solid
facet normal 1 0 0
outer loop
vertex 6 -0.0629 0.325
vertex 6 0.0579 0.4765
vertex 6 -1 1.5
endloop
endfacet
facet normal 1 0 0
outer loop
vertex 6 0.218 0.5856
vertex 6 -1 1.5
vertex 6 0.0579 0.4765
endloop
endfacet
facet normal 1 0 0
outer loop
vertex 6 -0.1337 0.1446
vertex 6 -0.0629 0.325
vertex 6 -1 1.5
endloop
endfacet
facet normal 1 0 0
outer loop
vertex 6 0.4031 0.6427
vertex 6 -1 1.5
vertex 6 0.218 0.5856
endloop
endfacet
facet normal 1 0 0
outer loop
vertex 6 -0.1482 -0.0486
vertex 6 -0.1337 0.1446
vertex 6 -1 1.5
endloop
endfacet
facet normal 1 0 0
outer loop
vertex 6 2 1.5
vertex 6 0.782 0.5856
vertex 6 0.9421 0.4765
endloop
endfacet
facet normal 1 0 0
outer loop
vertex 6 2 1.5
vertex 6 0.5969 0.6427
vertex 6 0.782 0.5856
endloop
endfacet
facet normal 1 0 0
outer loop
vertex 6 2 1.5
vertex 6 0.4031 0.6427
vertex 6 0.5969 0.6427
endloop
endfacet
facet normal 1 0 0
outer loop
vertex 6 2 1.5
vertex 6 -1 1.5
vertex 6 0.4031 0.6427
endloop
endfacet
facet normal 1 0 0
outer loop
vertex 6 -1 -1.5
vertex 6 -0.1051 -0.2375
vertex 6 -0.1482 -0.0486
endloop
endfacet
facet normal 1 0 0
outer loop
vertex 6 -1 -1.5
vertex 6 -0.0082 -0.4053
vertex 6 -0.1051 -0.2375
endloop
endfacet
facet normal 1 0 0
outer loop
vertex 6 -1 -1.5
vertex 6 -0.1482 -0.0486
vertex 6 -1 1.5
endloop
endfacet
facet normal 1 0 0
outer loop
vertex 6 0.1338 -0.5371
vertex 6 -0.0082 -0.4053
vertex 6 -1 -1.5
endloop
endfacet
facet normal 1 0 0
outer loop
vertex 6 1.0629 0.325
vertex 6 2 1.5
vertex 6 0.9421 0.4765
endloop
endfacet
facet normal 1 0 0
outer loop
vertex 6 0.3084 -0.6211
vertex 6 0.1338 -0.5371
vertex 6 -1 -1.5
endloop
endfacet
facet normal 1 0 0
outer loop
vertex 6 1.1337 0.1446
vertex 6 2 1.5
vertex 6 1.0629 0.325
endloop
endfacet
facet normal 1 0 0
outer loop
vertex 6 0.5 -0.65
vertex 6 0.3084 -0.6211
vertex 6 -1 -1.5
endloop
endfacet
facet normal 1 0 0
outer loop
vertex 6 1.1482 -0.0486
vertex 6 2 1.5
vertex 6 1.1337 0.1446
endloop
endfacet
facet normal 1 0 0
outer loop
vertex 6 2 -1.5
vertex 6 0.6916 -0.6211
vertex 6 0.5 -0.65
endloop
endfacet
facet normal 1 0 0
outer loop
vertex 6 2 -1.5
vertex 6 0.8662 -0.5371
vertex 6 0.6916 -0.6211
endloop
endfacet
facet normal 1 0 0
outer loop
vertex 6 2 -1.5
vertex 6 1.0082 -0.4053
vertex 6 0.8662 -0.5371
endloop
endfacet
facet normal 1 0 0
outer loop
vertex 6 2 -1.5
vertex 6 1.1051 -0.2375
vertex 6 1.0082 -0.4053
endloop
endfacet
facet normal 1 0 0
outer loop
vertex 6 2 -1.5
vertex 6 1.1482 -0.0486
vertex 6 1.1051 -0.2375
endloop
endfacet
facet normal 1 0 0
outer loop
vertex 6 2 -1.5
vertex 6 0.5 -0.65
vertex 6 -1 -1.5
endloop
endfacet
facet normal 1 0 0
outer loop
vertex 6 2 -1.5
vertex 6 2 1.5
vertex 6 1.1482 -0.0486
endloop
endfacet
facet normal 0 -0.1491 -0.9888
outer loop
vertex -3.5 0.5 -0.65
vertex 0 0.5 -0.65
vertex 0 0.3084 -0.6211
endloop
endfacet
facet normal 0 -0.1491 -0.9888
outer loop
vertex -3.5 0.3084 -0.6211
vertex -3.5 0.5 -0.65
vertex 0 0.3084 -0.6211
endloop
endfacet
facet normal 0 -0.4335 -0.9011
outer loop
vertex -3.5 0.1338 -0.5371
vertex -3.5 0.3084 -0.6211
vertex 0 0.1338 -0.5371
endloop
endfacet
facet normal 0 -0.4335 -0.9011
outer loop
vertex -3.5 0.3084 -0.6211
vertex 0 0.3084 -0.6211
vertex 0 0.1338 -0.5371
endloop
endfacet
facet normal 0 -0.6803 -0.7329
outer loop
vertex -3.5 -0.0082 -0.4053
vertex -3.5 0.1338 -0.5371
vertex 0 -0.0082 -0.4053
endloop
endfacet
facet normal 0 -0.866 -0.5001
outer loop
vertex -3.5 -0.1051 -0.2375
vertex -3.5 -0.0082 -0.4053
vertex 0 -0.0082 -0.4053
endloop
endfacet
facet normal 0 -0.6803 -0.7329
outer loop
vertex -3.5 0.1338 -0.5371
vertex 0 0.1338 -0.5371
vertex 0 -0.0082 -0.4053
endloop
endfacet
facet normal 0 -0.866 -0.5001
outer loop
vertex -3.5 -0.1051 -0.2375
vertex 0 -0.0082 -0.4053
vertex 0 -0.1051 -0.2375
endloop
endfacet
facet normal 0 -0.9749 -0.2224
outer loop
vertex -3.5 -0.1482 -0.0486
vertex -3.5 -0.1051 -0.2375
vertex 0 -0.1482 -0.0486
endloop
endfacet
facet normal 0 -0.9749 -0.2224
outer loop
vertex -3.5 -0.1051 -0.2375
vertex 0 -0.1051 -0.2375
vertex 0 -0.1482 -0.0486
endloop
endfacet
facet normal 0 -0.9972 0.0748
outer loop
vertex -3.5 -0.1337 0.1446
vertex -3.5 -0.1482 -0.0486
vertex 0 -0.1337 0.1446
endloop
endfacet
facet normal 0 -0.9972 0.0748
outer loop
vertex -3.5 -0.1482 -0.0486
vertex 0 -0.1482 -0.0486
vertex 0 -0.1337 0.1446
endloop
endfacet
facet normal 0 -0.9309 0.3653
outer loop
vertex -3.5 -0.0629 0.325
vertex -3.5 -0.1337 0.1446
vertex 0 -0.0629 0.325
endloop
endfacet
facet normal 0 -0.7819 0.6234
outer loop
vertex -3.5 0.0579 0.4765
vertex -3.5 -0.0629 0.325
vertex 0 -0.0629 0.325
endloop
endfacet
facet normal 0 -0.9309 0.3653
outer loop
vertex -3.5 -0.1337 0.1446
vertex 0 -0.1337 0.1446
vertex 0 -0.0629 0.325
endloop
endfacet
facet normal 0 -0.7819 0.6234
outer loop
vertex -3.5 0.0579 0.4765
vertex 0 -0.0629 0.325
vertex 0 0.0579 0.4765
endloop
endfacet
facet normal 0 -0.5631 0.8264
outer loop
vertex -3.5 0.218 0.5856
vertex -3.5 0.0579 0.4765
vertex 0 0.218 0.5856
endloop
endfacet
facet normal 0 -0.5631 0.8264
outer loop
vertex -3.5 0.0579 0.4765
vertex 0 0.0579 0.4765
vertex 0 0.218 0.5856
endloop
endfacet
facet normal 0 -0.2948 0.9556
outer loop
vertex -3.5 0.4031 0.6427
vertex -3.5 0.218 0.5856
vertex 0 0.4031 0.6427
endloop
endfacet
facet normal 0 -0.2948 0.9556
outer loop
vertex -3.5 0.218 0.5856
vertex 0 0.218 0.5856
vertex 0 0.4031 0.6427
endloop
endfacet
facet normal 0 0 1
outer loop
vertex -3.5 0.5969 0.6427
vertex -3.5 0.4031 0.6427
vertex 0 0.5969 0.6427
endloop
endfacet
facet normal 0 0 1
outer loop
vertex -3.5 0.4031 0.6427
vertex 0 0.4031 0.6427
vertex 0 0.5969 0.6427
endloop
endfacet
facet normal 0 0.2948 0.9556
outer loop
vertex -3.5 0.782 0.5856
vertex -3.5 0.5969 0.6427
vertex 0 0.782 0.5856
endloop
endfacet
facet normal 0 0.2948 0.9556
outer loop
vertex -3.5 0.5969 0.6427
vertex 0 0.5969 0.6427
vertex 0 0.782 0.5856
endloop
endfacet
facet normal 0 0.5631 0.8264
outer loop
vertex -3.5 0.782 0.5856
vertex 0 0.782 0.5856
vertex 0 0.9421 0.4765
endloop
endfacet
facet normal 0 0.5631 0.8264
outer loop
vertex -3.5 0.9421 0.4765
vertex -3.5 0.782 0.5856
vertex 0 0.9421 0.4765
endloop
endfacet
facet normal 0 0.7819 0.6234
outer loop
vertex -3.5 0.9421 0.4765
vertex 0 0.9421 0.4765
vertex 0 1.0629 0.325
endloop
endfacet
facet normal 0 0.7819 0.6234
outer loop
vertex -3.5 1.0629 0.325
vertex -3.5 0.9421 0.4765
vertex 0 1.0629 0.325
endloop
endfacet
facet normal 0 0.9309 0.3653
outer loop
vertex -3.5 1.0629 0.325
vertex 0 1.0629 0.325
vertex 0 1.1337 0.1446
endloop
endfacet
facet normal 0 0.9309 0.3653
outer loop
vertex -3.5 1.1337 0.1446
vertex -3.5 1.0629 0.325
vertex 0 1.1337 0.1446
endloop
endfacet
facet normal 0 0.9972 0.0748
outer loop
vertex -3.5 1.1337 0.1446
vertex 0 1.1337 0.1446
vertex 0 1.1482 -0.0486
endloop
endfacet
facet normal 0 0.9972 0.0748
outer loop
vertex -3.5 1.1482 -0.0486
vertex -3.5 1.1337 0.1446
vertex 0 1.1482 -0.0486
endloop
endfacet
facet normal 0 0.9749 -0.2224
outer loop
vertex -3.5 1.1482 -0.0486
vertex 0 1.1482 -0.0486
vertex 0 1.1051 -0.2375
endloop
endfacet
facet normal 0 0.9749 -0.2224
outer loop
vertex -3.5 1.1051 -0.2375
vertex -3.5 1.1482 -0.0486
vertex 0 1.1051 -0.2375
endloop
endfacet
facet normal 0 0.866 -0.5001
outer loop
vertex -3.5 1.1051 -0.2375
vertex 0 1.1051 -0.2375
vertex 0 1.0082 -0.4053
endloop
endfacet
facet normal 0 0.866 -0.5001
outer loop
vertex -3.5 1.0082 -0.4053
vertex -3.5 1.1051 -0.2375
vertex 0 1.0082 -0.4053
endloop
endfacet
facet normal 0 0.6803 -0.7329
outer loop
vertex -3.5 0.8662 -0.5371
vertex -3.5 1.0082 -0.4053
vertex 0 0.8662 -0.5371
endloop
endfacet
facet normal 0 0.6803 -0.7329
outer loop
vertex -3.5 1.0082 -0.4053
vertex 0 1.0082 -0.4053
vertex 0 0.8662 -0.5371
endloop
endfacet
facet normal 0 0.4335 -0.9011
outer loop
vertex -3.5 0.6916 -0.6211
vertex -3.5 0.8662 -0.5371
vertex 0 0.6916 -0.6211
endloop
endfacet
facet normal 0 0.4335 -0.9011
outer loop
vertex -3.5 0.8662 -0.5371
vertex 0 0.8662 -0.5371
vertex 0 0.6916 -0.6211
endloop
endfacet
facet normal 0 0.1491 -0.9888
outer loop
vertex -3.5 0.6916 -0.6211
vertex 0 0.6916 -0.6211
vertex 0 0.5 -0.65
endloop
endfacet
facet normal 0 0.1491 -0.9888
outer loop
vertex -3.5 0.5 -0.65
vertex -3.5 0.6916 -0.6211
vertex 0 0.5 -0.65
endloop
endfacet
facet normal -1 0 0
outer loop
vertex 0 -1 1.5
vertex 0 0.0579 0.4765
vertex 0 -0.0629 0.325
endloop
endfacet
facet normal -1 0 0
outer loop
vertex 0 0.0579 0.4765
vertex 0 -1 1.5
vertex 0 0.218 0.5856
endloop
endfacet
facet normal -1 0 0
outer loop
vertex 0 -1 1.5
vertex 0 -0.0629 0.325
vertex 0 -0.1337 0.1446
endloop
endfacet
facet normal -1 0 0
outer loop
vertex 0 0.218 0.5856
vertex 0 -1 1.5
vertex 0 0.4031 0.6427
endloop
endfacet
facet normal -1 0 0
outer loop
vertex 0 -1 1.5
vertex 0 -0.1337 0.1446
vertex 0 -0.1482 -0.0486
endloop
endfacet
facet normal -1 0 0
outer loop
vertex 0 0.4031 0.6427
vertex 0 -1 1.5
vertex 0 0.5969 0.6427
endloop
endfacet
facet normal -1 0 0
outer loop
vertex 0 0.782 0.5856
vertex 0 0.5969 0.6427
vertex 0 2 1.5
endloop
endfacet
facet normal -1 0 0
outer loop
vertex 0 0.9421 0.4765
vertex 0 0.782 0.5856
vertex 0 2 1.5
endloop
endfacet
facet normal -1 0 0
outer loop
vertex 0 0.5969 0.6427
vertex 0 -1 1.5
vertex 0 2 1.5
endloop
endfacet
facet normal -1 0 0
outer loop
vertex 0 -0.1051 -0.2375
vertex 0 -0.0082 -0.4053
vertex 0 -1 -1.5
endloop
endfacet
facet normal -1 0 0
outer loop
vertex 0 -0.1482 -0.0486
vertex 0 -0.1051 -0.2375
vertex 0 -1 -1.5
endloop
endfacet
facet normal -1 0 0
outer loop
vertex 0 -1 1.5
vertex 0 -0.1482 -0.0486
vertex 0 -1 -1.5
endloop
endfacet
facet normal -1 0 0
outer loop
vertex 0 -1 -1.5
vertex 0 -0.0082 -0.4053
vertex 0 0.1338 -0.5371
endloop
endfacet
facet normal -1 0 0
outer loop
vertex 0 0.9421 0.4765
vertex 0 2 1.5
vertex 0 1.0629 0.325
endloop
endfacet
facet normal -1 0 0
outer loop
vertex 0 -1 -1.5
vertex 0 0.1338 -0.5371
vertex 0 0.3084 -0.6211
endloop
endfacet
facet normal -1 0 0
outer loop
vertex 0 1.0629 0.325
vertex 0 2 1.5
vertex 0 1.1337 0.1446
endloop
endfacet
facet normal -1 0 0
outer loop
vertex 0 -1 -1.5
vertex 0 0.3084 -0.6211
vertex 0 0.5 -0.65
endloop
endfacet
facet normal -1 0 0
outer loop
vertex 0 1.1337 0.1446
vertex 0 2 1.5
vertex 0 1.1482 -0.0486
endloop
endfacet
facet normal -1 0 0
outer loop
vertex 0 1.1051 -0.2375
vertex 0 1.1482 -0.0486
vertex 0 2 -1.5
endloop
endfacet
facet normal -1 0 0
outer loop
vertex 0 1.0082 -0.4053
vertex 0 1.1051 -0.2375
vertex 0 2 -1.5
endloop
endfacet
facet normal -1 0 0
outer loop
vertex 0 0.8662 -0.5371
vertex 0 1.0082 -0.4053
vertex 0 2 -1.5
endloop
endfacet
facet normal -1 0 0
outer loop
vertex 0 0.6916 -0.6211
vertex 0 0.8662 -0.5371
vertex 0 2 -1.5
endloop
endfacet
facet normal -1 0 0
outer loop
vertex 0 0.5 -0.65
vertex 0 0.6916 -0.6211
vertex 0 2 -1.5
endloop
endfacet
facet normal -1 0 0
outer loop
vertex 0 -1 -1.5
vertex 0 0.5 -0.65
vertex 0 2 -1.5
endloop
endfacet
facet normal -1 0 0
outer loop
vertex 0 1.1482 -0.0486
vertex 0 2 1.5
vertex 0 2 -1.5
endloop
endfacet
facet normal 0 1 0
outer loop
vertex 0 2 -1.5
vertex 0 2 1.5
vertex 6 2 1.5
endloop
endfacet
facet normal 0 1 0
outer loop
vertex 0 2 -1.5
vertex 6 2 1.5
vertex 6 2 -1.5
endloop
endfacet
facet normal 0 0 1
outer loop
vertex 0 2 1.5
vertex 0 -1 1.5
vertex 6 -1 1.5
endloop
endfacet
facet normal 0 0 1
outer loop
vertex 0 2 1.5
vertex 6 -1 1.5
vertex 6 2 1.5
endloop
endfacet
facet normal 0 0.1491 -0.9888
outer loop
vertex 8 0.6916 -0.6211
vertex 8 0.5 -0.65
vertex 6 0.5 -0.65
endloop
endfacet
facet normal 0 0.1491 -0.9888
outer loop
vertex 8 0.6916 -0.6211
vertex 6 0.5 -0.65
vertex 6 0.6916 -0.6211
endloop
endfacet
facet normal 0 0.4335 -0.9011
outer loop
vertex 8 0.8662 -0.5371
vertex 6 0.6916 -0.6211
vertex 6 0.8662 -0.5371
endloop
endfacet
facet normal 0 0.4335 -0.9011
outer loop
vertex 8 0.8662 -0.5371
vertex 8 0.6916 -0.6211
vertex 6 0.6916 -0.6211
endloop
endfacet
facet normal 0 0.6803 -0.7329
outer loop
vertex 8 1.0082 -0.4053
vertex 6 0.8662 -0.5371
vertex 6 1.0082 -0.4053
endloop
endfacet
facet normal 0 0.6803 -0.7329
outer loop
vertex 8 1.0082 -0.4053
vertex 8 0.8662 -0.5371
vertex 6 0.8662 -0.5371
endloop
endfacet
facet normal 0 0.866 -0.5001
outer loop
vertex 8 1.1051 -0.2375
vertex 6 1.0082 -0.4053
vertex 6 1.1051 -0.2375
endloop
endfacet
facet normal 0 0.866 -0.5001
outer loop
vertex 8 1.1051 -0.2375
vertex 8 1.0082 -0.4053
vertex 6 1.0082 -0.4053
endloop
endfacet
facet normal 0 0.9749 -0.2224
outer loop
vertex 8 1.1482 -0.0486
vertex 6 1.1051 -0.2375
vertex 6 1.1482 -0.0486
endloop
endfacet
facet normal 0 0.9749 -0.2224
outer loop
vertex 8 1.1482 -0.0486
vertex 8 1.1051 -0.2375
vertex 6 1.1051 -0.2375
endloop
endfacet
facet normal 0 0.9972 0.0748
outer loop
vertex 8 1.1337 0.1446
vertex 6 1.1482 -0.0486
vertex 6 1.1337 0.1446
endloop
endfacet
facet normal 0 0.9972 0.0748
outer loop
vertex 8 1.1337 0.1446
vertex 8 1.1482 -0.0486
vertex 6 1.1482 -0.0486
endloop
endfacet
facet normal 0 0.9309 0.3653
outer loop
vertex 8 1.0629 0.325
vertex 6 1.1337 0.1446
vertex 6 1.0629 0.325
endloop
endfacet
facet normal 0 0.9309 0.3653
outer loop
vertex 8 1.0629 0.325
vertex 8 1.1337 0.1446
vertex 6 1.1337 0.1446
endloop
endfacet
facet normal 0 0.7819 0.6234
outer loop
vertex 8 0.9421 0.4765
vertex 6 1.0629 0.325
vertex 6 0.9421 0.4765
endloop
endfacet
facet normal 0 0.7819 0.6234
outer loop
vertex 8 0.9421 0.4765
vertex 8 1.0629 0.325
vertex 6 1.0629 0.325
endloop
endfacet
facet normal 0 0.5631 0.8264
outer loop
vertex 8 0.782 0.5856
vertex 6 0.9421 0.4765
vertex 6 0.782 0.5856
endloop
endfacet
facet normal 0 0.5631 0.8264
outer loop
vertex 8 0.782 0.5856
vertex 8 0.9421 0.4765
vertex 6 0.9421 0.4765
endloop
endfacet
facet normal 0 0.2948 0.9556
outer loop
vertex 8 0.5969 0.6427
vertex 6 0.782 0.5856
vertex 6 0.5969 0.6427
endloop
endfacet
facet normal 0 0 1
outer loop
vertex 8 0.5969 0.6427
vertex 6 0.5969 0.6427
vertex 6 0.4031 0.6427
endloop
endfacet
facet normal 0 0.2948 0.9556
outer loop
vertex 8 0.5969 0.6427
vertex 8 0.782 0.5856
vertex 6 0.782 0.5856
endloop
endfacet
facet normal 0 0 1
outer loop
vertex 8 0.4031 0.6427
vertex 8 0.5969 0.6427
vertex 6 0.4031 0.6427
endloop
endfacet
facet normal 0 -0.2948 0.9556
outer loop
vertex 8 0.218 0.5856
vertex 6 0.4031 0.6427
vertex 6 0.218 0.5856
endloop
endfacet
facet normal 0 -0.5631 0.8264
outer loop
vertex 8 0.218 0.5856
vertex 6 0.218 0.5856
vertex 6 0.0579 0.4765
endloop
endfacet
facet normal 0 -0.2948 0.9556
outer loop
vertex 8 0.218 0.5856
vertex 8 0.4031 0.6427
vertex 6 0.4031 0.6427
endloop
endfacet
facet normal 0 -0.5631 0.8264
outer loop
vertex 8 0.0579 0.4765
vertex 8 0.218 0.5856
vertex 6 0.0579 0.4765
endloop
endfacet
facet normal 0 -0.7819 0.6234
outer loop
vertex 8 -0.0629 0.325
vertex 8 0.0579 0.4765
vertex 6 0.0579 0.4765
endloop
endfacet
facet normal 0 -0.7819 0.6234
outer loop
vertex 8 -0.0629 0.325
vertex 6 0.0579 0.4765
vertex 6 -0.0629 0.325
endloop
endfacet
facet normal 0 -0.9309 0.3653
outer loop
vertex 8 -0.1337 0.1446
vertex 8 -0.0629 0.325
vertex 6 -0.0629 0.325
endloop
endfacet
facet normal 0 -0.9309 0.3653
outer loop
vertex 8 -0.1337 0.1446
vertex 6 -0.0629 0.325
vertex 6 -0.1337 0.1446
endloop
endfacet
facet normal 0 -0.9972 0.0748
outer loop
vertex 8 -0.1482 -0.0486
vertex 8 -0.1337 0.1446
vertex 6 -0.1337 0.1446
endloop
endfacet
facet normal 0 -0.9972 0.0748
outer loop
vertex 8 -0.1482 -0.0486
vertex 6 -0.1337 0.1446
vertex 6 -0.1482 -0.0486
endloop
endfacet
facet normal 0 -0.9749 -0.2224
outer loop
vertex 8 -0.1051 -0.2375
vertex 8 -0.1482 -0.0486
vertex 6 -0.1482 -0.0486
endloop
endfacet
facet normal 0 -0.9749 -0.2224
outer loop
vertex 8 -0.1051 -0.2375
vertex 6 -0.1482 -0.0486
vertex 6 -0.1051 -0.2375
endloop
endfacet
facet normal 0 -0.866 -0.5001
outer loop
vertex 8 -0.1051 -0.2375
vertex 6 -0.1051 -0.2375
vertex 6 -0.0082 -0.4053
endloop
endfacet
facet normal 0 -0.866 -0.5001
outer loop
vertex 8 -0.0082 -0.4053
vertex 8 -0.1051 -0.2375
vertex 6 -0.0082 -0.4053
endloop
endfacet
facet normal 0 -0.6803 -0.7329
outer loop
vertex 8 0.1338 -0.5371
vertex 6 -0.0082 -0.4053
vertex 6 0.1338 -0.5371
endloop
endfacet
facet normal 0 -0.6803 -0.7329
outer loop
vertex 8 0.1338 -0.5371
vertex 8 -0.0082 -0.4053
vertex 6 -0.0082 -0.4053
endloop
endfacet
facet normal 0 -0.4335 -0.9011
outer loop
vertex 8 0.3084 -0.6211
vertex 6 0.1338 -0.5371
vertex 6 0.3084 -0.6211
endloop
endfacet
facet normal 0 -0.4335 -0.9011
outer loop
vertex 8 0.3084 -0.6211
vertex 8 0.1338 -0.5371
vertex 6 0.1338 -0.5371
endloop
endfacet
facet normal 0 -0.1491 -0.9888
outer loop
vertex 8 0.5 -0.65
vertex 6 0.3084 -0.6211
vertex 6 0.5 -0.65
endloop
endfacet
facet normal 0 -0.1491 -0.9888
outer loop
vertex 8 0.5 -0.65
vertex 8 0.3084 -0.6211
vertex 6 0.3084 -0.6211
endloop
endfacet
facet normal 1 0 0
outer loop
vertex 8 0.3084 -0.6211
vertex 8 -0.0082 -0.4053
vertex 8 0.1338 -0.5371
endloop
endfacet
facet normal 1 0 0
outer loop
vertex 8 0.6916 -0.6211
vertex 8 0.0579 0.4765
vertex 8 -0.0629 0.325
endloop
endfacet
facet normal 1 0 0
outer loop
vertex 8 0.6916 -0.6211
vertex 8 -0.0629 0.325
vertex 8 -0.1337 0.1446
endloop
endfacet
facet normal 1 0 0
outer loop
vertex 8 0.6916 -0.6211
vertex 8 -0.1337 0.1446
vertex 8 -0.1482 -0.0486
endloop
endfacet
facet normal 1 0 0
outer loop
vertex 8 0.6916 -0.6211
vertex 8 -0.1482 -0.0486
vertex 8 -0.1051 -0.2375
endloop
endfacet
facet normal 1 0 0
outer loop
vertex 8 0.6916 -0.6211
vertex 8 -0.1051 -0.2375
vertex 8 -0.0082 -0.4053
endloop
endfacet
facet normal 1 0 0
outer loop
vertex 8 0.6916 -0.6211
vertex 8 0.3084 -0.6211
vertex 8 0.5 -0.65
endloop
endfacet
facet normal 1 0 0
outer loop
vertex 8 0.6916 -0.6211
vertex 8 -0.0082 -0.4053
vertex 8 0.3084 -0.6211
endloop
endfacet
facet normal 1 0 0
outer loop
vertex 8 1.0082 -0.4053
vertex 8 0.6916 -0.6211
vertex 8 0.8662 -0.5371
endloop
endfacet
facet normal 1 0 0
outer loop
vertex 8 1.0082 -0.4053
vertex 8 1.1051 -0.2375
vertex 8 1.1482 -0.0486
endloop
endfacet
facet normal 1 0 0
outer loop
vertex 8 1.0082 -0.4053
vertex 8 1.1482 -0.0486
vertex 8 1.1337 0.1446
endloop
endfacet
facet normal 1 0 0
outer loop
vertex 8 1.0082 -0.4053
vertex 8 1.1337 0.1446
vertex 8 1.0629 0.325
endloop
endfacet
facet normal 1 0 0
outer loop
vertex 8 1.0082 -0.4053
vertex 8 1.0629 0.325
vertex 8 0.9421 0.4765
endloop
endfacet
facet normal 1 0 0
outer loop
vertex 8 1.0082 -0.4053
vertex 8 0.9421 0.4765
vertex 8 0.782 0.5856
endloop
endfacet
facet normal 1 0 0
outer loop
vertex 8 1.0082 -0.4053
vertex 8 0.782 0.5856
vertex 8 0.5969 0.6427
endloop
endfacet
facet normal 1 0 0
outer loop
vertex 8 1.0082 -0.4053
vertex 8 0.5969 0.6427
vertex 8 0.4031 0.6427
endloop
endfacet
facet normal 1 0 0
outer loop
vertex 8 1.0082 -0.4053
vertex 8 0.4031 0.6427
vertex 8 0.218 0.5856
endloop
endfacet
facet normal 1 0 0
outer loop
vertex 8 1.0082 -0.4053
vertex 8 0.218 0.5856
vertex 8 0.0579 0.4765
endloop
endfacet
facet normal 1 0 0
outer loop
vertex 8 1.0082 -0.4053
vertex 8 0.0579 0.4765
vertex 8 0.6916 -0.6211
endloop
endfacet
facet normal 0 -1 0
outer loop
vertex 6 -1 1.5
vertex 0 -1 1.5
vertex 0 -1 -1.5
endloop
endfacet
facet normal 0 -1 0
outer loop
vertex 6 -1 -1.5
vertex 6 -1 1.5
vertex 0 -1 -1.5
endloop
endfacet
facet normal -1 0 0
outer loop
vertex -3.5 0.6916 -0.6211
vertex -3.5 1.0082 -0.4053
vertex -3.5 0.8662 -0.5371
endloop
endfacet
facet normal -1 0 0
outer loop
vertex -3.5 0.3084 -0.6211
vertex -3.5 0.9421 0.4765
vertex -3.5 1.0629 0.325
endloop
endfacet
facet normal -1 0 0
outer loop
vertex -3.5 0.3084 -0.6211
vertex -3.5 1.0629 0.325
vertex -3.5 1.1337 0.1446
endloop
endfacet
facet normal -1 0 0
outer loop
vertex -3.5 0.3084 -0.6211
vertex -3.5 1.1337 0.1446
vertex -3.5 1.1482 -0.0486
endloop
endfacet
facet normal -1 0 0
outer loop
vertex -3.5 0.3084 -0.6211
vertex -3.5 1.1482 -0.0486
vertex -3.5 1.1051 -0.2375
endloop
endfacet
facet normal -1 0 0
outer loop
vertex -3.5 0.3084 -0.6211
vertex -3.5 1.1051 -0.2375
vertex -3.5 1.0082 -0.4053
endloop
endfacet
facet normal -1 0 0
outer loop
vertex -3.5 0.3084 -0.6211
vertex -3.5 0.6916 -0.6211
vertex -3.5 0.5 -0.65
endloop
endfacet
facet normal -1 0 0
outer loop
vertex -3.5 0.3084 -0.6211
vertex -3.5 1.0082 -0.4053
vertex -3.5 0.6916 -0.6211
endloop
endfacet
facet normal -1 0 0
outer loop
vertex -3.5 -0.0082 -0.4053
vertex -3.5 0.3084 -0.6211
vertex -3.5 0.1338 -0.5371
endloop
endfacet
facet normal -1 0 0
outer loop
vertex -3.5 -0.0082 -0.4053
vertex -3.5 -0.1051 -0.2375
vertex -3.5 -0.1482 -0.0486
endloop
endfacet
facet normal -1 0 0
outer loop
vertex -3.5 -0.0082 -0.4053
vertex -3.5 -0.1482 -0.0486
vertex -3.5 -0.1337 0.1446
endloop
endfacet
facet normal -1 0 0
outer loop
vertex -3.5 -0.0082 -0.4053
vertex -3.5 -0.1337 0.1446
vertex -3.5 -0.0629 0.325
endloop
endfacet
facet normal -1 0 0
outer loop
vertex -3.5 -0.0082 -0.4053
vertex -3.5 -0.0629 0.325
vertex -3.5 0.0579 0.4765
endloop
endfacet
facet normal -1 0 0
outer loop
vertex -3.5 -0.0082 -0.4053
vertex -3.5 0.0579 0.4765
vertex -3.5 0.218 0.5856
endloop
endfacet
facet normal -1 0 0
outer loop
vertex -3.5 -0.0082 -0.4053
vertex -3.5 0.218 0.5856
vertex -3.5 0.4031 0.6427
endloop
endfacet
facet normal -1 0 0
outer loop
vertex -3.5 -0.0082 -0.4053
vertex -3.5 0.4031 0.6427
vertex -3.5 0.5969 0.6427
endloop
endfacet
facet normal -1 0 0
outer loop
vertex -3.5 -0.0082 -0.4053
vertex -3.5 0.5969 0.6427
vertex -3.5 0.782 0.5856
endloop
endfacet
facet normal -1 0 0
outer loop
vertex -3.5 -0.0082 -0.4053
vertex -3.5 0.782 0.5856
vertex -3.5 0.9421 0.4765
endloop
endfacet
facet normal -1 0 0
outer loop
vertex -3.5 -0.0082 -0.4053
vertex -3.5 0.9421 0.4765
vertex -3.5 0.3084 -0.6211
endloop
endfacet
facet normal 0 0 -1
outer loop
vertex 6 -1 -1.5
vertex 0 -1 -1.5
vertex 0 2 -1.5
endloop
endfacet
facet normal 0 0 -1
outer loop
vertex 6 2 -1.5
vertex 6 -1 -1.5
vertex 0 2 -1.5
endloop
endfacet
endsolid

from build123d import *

# Parameters (mm, degrees)
CROQUIS1_W              = 3
CROQUIS1_H              = 3
SALIENTE_EXTRUIR1_DEPTH = 6
CROQUIS2_R              = 0.65
SALIENTE_EXTRUIR2_DEPTH = 3.5
SALIENTE_EXTRUIR3_START = 2
CROQUIS6_R              = 0.65
SALIENTE_EXTRUIR3_DEPTH = 2


with BuildPart() as part:
    # Croquis1 → Saliente-Extruir1 (new body)
    with BuildSketch(Plane(origin=(0, 0, 0), x_dir=(0, 0, -1), z_dir=(1, 0, 0))):
        with Locations((0, 0.5)):
            Rectangle(CROQUIS1_W, CROQUIS1_H)
    extrude(amount=SALIENTE_EXTRUIR1_DEPTH)

    # Croquis2 → Saliente-Extruir2 (add)
    with BuildSketch(Plane.ZY):
        with Locations(Location((0, 0.5, 0), (0, 0, 180))):
            Circle(CROQUIS2_R)
    extrude(amount=SALIENTE_EXTRUIR2_DEPTH)

    # Croquis6 → Saliente-Extruir3 (add)
    with BuildSketch(Plane(origin=(6, 0, 0), x_dir=(0, 0, -1), z_dir=(1, 0, 0)).offset(SALIENTE_EXTRUIR3_START)):
        with Locations((0, 0.5)):
            Circle(CROQUIS6_R)
    extrude(amount=-SALIENTE_EXTRUIR3_DEPTH)


solid = part.part
